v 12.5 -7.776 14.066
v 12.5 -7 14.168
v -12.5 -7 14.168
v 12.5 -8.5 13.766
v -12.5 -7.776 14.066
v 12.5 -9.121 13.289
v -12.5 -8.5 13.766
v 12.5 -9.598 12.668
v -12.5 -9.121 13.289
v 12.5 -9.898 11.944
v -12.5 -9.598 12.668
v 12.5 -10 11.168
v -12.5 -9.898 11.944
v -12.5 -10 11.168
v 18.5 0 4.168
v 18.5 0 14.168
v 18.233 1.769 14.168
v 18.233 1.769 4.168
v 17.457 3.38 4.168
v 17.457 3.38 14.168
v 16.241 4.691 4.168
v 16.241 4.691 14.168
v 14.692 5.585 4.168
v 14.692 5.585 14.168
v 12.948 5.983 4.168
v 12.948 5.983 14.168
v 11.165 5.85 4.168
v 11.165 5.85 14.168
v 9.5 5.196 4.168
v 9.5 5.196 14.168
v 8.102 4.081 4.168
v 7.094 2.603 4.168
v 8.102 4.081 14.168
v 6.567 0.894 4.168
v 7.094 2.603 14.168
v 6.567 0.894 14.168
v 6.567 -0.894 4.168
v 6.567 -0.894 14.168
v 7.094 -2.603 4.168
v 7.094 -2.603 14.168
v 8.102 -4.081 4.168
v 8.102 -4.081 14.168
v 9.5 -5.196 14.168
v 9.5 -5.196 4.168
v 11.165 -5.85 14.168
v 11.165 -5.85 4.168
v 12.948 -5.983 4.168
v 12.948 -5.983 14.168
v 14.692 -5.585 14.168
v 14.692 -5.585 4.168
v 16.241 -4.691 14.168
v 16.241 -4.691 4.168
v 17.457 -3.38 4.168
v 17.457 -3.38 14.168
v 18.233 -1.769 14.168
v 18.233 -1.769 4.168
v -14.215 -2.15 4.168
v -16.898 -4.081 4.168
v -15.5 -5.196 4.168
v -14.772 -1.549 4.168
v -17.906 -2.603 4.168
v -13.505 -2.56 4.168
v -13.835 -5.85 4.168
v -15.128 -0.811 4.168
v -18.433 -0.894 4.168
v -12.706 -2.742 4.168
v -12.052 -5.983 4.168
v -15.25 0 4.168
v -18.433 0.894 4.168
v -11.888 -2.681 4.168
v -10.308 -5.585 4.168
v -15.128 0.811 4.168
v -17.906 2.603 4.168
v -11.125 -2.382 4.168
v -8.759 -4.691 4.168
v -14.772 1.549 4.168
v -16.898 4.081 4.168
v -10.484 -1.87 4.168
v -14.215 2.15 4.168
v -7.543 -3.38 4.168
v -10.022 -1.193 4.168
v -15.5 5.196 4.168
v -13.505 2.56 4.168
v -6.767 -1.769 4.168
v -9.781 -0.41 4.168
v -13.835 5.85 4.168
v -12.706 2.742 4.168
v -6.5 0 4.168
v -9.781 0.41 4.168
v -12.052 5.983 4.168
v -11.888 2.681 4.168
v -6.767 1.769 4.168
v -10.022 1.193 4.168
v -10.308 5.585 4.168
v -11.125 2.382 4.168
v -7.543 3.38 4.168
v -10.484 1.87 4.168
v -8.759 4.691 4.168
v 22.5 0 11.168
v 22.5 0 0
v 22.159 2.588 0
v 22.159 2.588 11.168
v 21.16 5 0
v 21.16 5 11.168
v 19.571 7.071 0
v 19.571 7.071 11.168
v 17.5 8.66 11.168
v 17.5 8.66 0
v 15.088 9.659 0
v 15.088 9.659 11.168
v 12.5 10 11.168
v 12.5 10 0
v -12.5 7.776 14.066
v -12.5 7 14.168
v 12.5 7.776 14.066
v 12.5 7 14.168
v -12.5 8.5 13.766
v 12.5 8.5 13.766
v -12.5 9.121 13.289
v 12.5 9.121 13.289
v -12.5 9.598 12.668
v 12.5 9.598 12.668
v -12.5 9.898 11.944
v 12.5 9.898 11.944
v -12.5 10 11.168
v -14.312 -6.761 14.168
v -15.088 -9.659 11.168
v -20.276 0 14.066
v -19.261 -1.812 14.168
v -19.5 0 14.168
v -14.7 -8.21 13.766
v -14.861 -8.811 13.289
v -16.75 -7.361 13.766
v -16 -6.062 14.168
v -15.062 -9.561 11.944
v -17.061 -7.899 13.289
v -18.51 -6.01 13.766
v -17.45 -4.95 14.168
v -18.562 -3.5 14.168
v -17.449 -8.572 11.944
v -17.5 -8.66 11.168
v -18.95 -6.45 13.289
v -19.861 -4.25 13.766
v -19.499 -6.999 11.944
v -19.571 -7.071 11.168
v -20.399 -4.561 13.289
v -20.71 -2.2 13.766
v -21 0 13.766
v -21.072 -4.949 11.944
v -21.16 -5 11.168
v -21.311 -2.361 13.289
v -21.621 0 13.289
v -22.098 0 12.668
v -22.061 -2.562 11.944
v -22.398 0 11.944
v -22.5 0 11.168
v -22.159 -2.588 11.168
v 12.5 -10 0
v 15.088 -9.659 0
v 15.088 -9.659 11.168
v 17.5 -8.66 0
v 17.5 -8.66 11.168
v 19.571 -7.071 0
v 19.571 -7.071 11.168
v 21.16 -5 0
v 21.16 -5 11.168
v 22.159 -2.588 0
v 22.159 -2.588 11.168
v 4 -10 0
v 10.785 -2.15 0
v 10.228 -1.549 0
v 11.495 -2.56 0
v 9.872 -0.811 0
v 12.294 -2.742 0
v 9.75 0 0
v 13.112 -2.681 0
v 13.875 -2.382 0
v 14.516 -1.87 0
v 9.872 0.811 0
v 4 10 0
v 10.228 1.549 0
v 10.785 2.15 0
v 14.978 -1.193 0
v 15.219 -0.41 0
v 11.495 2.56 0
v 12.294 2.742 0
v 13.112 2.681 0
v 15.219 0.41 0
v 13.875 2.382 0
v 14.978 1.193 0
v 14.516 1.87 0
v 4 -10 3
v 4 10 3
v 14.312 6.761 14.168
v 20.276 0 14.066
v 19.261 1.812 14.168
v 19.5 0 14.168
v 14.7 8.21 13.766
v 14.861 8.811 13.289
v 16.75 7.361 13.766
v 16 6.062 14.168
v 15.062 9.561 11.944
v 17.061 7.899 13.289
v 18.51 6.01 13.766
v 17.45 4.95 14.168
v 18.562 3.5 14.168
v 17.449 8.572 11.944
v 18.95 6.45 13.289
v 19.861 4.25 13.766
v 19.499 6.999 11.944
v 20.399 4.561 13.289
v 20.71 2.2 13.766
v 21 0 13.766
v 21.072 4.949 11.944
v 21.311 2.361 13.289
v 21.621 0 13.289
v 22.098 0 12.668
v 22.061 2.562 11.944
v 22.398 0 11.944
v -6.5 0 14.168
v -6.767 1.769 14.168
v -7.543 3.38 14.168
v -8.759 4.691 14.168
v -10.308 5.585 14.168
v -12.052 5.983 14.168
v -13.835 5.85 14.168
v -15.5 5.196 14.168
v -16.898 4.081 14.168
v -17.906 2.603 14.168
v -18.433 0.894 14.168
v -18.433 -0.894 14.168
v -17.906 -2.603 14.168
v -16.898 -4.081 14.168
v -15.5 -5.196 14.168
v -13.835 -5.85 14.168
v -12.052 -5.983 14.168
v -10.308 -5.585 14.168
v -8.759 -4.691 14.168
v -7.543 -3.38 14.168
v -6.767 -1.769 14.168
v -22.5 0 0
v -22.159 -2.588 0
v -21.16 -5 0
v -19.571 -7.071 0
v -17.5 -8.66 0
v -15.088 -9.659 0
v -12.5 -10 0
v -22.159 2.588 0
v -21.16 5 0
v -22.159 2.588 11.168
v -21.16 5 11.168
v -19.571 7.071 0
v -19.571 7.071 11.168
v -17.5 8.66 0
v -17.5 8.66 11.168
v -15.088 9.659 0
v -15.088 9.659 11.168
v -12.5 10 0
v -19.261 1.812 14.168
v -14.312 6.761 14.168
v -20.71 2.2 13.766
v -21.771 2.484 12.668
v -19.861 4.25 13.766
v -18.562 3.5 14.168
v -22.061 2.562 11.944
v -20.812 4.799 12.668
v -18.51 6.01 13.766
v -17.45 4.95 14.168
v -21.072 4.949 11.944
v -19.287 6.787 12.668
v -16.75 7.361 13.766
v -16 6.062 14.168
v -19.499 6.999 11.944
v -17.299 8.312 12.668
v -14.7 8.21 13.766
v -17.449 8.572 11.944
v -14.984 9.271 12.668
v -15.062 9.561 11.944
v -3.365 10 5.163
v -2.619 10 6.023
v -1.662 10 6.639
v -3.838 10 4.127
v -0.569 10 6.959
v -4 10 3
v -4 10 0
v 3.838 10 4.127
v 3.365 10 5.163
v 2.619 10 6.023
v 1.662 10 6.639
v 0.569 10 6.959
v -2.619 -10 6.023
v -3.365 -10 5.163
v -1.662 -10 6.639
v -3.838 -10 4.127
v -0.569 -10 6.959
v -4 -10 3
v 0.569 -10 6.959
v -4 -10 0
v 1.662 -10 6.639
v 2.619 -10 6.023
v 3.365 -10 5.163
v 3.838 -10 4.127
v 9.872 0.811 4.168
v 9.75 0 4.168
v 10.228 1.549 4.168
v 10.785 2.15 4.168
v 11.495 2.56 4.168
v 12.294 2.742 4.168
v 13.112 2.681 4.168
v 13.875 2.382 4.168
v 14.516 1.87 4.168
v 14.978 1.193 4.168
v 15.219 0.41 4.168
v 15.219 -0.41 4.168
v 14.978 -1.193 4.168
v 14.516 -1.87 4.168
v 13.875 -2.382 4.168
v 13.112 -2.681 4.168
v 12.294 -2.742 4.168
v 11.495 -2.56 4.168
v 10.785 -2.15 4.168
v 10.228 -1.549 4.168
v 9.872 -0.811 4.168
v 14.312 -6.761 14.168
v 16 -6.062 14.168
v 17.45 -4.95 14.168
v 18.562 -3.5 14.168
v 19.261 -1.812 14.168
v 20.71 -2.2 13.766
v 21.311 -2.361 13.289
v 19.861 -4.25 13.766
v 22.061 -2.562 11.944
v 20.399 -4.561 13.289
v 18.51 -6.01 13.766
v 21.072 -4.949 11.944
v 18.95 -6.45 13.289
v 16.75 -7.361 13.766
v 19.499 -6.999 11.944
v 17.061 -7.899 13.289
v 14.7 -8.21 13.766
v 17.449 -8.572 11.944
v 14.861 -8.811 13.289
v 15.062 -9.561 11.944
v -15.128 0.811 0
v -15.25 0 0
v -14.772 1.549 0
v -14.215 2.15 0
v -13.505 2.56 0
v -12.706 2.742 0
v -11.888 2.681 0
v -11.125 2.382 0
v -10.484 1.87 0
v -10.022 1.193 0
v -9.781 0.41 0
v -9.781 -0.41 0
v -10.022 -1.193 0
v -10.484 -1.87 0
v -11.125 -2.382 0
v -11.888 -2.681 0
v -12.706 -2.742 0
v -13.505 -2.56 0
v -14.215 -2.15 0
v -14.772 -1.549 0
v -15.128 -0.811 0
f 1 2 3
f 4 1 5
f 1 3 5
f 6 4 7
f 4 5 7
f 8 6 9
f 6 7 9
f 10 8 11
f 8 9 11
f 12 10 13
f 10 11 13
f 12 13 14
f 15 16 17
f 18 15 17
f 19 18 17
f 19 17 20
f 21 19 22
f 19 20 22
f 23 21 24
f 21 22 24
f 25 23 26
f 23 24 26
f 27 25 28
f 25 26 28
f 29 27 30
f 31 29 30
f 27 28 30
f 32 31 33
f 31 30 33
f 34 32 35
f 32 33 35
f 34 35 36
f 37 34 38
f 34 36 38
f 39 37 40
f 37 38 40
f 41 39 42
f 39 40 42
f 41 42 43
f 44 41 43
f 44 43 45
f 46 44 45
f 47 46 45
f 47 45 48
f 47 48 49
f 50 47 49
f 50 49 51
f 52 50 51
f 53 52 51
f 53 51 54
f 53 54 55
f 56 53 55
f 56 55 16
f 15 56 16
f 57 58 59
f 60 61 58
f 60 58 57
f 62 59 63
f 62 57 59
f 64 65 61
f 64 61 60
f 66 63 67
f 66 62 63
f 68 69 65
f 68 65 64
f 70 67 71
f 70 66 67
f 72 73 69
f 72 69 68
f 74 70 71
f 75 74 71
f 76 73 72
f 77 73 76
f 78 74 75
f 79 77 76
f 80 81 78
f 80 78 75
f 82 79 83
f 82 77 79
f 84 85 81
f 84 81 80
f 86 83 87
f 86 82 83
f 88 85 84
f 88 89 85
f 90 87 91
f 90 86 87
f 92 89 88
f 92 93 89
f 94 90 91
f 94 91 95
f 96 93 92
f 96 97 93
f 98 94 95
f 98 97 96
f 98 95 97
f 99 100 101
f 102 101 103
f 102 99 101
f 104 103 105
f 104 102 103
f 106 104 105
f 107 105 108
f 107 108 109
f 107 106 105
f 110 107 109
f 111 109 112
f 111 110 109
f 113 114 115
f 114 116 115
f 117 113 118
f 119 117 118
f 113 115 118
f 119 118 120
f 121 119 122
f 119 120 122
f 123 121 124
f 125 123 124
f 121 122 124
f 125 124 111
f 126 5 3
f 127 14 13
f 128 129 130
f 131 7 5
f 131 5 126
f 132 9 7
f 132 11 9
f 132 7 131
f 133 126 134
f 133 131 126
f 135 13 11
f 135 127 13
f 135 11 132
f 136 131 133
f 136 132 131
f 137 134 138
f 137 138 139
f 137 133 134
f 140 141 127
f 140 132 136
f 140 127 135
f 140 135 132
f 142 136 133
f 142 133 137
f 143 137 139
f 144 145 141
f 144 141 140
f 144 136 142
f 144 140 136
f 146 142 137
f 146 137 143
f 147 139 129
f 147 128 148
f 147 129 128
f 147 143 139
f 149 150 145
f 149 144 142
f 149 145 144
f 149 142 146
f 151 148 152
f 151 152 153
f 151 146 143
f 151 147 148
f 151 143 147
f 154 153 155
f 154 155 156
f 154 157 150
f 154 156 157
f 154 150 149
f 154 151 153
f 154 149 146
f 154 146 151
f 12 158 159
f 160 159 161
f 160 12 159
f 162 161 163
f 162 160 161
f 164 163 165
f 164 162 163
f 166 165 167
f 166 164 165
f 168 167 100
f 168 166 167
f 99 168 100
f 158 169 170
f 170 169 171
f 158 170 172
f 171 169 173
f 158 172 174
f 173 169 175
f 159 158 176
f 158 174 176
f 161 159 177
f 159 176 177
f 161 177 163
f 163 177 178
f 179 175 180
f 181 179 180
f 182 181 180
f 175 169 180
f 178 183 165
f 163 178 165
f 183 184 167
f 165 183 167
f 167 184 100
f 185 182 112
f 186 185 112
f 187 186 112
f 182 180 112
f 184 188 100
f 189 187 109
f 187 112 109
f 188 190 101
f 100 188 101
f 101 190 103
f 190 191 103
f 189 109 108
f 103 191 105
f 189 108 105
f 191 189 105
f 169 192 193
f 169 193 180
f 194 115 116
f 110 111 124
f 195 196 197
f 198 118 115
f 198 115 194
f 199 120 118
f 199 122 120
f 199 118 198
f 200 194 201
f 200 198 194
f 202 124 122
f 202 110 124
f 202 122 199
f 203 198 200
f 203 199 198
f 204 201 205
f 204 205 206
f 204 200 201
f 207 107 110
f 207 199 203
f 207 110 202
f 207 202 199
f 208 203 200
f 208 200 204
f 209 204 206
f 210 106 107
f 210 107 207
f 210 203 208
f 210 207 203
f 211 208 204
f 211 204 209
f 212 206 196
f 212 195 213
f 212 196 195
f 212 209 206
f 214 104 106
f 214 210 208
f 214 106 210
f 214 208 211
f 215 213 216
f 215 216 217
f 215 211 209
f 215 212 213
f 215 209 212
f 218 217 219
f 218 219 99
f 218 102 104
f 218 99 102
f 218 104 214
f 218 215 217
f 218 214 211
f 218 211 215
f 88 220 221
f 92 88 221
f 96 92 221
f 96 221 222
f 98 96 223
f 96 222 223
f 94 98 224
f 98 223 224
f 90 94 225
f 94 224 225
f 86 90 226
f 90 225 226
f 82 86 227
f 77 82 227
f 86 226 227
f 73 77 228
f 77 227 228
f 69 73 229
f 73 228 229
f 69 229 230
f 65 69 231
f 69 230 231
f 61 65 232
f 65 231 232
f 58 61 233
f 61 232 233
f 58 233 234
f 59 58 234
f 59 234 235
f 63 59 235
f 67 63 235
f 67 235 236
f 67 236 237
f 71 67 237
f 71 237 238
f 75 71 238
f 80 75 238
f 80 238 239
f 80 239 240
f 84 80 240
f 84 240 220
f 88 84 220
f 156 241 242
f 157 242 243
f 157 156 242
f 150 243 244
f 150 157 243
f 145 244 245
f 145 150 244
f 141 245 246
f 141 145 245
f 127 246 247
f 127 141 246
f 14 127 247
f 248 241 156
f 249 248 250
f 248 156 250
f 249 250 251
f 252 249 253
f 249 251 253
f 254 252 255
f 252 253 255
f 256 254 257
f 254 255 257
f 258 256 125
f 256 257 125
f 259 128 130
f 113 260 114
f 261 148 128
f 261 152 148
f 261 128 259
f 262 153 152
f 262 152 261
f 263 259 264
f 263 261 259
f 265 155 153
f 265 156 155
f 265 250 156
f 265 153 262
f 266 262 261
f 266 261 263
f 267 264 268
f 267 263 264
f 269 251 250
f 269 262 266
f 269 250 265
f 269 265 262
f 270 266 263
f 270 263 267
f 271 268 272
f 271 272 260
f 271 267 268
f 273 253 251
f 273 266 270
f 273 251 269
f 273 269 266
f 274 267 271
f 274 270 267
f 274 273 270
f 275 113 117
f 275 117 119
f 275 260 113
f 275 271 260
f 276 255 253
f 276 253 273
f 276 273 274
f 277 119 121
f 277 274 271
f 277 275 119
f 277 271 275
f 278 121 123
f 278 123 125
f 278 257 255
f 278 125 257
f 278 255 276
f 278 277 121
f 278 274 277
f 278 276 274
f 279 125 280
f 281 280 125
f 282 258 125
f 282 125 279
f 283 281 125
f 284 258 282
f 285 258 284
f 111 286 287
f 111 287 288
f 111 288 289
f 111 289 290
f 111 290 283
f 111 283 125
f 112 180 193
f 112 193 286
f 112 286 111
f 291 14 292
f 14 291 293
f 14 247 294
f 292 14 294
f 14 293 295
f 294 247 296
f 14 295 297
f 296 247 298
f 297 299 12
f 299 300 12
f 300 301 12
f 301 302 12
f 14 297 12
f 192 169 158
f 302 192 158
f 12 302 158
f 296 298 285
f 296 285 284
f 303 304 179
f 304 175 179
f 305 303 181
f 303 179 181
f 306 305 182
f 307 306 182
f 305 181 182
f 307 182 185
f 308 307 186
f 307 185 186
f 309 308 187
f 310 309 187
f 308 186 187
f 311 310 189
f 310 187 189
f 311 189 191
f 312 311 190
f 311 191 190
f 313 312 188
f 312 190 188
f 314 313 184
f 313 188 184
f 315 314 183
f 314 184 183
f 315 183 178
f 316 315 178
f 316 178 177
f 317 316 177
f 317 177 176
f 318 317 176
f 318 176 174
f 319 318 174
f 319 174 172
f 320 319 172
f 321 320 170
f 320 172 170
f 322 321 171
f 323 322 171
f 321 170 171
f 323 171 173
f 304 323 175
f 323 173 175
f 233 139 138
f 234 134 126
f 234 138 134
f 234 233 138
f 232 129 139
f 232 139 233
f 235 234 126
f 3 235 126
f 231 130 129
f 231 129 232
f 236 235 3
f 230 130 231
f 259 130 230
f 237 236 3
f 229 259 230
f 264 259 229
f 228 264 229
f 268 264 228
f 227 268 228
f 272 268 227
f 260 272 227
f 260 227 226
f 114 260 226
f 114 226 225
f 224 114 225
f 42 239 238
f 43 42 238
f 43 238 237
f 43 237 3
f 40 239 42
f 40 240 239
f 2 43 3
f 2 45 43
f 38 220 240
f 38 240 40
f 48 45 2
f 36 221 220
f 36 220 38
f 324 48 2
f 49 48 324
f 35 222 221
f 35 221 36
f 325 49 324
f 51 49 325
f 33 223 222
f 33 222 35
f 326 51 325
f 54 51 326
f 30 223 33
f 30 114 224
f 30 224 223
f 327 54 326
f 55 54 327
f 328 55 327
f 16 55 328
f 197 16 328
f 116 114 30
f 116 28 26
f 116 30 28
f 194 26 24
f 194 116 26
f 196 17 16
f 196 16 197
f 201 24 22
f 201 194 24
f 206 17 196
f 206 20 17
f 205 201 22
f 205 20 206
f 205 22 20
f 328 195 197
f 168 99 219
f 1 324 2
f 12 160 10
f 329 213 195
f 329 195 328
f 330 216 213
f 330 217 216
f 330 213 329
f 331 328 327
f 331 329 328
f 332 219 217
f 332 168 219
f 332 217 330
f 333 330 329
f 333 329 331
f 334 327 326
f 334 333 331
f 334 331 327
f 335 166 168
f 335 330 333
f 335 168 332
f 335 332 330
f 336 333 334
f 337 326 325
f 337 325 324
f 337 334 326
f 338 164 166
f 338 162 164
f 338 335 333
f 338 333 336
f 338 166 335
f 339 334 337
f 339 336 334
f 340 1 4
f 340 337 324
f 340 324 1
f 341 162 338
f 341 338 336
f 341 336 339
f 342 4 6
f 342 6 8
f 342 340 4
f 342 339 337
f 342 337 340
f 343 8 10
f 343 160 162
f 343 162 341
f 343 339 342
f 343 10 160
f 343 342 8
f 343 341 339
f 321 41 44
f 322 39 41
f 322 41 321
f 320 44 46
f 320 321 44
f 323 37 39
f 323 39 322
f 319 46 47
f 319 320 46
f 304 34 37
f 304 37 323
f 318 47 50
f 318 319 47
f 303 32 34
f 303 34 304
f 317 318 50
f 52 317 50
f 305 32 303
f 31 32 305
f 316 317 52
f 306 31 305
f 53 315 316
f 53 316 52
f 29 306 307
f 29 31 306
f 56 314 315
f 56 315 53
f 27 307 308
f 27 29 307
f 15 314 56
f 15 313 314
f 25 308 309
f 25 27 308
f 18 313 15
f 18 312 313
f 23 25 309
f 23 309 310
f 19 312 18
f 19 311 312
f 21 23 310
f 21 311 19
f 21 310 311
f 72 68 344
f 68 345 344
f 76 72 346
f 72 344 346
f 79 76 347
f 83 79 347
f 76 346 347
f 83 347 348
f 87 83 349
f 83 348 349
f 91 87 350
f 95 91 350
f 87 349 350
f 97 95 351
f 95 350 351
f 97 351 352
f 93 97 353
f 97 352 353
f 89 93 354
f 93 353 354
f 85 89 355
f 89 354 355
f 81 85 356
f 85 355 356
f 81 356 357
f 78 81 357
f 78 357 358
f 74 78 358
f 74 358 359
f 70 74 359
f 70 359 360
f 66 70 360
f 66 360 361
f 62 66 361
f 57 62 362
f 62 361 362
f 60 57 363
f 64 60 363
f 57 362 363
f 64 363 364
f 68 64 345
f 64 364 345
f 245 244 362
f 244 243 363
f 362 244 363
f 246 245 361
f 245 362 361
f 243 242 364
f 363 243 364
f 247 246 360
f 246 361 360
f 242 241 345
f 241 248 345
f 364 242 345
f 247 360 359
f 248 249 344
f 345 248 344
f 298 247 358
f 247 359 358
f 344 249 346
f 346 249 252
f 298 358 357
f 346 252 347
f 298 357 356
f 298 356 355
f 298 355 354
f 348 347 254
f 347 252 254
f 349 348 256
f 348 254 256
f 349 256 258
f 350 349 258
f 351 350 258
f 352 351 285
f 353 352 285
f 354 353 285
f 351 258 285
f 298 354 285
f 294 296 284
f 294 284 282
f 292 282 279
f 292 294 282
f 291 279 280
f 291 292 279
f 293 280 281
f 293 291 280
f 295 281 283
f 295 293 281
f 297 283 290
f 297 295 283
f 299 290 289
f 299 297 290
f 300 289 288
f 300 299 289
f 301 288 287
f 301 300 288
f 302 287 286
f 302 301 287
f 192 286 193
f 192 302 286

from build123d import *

# Parameters (mm, degrees)
SKETCH2_W                               = 45
SKETCH2_H                               = 20
BOSS_EXTRUDE2_DEPTH                     = 14.16787265
FILLET1_R                               = 10
CUT_EXTRUDE1_DEPTH                      = 22
CBORE_FOR_M5_HEX_HEAD_BOLT1_D           = 5.5
CBORE_FOR_M5_HEX_HEAD_BOLT1_CBORE_D     = 12
CBORE_FOR_M5_HEX_HEAD_BOLT1_CBORE_DEPTH = 10
FILLET2_R                               = 3


with BuildPart() as part:
    # Sketch2 → Boss-Extrude2 (new body)
    with BuildSketch(Plane.XY):
        Rectangle(SKETCH2_W, SKETCH2_H)
    extrude(amount=BOSS_EXTRUDE2_DEPTH)

    # Fillet1
    fillet1_edges = [part.edges().sort_by_distance(p)[0] for p in [
        (22.5, 10, 7.083936325),
        (22.5, -10, 7.083936325),
        (-22.5, 10, 7.083936325),
        (-22.5, -10, 7.083936325),
    ]]
    fillet(fillet1_edges, radius=FILLET1_R - 0.0001)  # a hair under: the kernel refuses the full size

    # Sketch3 → Cut-Extrude1 (cut)
    with BuildSketch(Plane.XZ.offset(10)):
        with BuildLine():
            Line((-4, 0), (-4, 3))
            ThreePointArc((-4, 3), (0, 7), (4, 3))
            Line((4, 3), (4, 0))
            ThreePointArc((4, 0), (0, -4), (-4, 0))
        make_face()
    extrude(amount=-CUT_EXTRUDE1_DEPTH, mode=Mode.SUBTRACT)

    # CBORE for M5 Hex Head Bolt1 (through all)
    with Locations(Plane.XY.offset(14.16787265)):
        with Locations((-12.5, 0), (12.5, 0)):
            CounterBoreHole(CBORE_FOR_M5_HEX_HEAD_BOLT1_D / 2, CBORE_FOR_M5_HEX_HEAD_BOLT1_CBORE_D / 2, CBORE_FOR_M5_HEX_HEAD_BOLT1_CBORE_DEPTH)

    # Fillet2
    fillet2_edges = [part.edges().sort_by_distance(p)[0] for p in [
        (0, 10, 14.16787265),
        (0, -10, 14.16787265),
        (-19.571097101, -7.071097101, 14.16787265),
        (-19.571097101, 7.071097101, 14.16787265),
        (19.571097101, -7.071097101, 14.16787265),
        (19.571097101, 7.071097101, 14.16787265),
    ]]
    fillet(fillet2_edges, radius=FILLET2_R)


solid = part.part
